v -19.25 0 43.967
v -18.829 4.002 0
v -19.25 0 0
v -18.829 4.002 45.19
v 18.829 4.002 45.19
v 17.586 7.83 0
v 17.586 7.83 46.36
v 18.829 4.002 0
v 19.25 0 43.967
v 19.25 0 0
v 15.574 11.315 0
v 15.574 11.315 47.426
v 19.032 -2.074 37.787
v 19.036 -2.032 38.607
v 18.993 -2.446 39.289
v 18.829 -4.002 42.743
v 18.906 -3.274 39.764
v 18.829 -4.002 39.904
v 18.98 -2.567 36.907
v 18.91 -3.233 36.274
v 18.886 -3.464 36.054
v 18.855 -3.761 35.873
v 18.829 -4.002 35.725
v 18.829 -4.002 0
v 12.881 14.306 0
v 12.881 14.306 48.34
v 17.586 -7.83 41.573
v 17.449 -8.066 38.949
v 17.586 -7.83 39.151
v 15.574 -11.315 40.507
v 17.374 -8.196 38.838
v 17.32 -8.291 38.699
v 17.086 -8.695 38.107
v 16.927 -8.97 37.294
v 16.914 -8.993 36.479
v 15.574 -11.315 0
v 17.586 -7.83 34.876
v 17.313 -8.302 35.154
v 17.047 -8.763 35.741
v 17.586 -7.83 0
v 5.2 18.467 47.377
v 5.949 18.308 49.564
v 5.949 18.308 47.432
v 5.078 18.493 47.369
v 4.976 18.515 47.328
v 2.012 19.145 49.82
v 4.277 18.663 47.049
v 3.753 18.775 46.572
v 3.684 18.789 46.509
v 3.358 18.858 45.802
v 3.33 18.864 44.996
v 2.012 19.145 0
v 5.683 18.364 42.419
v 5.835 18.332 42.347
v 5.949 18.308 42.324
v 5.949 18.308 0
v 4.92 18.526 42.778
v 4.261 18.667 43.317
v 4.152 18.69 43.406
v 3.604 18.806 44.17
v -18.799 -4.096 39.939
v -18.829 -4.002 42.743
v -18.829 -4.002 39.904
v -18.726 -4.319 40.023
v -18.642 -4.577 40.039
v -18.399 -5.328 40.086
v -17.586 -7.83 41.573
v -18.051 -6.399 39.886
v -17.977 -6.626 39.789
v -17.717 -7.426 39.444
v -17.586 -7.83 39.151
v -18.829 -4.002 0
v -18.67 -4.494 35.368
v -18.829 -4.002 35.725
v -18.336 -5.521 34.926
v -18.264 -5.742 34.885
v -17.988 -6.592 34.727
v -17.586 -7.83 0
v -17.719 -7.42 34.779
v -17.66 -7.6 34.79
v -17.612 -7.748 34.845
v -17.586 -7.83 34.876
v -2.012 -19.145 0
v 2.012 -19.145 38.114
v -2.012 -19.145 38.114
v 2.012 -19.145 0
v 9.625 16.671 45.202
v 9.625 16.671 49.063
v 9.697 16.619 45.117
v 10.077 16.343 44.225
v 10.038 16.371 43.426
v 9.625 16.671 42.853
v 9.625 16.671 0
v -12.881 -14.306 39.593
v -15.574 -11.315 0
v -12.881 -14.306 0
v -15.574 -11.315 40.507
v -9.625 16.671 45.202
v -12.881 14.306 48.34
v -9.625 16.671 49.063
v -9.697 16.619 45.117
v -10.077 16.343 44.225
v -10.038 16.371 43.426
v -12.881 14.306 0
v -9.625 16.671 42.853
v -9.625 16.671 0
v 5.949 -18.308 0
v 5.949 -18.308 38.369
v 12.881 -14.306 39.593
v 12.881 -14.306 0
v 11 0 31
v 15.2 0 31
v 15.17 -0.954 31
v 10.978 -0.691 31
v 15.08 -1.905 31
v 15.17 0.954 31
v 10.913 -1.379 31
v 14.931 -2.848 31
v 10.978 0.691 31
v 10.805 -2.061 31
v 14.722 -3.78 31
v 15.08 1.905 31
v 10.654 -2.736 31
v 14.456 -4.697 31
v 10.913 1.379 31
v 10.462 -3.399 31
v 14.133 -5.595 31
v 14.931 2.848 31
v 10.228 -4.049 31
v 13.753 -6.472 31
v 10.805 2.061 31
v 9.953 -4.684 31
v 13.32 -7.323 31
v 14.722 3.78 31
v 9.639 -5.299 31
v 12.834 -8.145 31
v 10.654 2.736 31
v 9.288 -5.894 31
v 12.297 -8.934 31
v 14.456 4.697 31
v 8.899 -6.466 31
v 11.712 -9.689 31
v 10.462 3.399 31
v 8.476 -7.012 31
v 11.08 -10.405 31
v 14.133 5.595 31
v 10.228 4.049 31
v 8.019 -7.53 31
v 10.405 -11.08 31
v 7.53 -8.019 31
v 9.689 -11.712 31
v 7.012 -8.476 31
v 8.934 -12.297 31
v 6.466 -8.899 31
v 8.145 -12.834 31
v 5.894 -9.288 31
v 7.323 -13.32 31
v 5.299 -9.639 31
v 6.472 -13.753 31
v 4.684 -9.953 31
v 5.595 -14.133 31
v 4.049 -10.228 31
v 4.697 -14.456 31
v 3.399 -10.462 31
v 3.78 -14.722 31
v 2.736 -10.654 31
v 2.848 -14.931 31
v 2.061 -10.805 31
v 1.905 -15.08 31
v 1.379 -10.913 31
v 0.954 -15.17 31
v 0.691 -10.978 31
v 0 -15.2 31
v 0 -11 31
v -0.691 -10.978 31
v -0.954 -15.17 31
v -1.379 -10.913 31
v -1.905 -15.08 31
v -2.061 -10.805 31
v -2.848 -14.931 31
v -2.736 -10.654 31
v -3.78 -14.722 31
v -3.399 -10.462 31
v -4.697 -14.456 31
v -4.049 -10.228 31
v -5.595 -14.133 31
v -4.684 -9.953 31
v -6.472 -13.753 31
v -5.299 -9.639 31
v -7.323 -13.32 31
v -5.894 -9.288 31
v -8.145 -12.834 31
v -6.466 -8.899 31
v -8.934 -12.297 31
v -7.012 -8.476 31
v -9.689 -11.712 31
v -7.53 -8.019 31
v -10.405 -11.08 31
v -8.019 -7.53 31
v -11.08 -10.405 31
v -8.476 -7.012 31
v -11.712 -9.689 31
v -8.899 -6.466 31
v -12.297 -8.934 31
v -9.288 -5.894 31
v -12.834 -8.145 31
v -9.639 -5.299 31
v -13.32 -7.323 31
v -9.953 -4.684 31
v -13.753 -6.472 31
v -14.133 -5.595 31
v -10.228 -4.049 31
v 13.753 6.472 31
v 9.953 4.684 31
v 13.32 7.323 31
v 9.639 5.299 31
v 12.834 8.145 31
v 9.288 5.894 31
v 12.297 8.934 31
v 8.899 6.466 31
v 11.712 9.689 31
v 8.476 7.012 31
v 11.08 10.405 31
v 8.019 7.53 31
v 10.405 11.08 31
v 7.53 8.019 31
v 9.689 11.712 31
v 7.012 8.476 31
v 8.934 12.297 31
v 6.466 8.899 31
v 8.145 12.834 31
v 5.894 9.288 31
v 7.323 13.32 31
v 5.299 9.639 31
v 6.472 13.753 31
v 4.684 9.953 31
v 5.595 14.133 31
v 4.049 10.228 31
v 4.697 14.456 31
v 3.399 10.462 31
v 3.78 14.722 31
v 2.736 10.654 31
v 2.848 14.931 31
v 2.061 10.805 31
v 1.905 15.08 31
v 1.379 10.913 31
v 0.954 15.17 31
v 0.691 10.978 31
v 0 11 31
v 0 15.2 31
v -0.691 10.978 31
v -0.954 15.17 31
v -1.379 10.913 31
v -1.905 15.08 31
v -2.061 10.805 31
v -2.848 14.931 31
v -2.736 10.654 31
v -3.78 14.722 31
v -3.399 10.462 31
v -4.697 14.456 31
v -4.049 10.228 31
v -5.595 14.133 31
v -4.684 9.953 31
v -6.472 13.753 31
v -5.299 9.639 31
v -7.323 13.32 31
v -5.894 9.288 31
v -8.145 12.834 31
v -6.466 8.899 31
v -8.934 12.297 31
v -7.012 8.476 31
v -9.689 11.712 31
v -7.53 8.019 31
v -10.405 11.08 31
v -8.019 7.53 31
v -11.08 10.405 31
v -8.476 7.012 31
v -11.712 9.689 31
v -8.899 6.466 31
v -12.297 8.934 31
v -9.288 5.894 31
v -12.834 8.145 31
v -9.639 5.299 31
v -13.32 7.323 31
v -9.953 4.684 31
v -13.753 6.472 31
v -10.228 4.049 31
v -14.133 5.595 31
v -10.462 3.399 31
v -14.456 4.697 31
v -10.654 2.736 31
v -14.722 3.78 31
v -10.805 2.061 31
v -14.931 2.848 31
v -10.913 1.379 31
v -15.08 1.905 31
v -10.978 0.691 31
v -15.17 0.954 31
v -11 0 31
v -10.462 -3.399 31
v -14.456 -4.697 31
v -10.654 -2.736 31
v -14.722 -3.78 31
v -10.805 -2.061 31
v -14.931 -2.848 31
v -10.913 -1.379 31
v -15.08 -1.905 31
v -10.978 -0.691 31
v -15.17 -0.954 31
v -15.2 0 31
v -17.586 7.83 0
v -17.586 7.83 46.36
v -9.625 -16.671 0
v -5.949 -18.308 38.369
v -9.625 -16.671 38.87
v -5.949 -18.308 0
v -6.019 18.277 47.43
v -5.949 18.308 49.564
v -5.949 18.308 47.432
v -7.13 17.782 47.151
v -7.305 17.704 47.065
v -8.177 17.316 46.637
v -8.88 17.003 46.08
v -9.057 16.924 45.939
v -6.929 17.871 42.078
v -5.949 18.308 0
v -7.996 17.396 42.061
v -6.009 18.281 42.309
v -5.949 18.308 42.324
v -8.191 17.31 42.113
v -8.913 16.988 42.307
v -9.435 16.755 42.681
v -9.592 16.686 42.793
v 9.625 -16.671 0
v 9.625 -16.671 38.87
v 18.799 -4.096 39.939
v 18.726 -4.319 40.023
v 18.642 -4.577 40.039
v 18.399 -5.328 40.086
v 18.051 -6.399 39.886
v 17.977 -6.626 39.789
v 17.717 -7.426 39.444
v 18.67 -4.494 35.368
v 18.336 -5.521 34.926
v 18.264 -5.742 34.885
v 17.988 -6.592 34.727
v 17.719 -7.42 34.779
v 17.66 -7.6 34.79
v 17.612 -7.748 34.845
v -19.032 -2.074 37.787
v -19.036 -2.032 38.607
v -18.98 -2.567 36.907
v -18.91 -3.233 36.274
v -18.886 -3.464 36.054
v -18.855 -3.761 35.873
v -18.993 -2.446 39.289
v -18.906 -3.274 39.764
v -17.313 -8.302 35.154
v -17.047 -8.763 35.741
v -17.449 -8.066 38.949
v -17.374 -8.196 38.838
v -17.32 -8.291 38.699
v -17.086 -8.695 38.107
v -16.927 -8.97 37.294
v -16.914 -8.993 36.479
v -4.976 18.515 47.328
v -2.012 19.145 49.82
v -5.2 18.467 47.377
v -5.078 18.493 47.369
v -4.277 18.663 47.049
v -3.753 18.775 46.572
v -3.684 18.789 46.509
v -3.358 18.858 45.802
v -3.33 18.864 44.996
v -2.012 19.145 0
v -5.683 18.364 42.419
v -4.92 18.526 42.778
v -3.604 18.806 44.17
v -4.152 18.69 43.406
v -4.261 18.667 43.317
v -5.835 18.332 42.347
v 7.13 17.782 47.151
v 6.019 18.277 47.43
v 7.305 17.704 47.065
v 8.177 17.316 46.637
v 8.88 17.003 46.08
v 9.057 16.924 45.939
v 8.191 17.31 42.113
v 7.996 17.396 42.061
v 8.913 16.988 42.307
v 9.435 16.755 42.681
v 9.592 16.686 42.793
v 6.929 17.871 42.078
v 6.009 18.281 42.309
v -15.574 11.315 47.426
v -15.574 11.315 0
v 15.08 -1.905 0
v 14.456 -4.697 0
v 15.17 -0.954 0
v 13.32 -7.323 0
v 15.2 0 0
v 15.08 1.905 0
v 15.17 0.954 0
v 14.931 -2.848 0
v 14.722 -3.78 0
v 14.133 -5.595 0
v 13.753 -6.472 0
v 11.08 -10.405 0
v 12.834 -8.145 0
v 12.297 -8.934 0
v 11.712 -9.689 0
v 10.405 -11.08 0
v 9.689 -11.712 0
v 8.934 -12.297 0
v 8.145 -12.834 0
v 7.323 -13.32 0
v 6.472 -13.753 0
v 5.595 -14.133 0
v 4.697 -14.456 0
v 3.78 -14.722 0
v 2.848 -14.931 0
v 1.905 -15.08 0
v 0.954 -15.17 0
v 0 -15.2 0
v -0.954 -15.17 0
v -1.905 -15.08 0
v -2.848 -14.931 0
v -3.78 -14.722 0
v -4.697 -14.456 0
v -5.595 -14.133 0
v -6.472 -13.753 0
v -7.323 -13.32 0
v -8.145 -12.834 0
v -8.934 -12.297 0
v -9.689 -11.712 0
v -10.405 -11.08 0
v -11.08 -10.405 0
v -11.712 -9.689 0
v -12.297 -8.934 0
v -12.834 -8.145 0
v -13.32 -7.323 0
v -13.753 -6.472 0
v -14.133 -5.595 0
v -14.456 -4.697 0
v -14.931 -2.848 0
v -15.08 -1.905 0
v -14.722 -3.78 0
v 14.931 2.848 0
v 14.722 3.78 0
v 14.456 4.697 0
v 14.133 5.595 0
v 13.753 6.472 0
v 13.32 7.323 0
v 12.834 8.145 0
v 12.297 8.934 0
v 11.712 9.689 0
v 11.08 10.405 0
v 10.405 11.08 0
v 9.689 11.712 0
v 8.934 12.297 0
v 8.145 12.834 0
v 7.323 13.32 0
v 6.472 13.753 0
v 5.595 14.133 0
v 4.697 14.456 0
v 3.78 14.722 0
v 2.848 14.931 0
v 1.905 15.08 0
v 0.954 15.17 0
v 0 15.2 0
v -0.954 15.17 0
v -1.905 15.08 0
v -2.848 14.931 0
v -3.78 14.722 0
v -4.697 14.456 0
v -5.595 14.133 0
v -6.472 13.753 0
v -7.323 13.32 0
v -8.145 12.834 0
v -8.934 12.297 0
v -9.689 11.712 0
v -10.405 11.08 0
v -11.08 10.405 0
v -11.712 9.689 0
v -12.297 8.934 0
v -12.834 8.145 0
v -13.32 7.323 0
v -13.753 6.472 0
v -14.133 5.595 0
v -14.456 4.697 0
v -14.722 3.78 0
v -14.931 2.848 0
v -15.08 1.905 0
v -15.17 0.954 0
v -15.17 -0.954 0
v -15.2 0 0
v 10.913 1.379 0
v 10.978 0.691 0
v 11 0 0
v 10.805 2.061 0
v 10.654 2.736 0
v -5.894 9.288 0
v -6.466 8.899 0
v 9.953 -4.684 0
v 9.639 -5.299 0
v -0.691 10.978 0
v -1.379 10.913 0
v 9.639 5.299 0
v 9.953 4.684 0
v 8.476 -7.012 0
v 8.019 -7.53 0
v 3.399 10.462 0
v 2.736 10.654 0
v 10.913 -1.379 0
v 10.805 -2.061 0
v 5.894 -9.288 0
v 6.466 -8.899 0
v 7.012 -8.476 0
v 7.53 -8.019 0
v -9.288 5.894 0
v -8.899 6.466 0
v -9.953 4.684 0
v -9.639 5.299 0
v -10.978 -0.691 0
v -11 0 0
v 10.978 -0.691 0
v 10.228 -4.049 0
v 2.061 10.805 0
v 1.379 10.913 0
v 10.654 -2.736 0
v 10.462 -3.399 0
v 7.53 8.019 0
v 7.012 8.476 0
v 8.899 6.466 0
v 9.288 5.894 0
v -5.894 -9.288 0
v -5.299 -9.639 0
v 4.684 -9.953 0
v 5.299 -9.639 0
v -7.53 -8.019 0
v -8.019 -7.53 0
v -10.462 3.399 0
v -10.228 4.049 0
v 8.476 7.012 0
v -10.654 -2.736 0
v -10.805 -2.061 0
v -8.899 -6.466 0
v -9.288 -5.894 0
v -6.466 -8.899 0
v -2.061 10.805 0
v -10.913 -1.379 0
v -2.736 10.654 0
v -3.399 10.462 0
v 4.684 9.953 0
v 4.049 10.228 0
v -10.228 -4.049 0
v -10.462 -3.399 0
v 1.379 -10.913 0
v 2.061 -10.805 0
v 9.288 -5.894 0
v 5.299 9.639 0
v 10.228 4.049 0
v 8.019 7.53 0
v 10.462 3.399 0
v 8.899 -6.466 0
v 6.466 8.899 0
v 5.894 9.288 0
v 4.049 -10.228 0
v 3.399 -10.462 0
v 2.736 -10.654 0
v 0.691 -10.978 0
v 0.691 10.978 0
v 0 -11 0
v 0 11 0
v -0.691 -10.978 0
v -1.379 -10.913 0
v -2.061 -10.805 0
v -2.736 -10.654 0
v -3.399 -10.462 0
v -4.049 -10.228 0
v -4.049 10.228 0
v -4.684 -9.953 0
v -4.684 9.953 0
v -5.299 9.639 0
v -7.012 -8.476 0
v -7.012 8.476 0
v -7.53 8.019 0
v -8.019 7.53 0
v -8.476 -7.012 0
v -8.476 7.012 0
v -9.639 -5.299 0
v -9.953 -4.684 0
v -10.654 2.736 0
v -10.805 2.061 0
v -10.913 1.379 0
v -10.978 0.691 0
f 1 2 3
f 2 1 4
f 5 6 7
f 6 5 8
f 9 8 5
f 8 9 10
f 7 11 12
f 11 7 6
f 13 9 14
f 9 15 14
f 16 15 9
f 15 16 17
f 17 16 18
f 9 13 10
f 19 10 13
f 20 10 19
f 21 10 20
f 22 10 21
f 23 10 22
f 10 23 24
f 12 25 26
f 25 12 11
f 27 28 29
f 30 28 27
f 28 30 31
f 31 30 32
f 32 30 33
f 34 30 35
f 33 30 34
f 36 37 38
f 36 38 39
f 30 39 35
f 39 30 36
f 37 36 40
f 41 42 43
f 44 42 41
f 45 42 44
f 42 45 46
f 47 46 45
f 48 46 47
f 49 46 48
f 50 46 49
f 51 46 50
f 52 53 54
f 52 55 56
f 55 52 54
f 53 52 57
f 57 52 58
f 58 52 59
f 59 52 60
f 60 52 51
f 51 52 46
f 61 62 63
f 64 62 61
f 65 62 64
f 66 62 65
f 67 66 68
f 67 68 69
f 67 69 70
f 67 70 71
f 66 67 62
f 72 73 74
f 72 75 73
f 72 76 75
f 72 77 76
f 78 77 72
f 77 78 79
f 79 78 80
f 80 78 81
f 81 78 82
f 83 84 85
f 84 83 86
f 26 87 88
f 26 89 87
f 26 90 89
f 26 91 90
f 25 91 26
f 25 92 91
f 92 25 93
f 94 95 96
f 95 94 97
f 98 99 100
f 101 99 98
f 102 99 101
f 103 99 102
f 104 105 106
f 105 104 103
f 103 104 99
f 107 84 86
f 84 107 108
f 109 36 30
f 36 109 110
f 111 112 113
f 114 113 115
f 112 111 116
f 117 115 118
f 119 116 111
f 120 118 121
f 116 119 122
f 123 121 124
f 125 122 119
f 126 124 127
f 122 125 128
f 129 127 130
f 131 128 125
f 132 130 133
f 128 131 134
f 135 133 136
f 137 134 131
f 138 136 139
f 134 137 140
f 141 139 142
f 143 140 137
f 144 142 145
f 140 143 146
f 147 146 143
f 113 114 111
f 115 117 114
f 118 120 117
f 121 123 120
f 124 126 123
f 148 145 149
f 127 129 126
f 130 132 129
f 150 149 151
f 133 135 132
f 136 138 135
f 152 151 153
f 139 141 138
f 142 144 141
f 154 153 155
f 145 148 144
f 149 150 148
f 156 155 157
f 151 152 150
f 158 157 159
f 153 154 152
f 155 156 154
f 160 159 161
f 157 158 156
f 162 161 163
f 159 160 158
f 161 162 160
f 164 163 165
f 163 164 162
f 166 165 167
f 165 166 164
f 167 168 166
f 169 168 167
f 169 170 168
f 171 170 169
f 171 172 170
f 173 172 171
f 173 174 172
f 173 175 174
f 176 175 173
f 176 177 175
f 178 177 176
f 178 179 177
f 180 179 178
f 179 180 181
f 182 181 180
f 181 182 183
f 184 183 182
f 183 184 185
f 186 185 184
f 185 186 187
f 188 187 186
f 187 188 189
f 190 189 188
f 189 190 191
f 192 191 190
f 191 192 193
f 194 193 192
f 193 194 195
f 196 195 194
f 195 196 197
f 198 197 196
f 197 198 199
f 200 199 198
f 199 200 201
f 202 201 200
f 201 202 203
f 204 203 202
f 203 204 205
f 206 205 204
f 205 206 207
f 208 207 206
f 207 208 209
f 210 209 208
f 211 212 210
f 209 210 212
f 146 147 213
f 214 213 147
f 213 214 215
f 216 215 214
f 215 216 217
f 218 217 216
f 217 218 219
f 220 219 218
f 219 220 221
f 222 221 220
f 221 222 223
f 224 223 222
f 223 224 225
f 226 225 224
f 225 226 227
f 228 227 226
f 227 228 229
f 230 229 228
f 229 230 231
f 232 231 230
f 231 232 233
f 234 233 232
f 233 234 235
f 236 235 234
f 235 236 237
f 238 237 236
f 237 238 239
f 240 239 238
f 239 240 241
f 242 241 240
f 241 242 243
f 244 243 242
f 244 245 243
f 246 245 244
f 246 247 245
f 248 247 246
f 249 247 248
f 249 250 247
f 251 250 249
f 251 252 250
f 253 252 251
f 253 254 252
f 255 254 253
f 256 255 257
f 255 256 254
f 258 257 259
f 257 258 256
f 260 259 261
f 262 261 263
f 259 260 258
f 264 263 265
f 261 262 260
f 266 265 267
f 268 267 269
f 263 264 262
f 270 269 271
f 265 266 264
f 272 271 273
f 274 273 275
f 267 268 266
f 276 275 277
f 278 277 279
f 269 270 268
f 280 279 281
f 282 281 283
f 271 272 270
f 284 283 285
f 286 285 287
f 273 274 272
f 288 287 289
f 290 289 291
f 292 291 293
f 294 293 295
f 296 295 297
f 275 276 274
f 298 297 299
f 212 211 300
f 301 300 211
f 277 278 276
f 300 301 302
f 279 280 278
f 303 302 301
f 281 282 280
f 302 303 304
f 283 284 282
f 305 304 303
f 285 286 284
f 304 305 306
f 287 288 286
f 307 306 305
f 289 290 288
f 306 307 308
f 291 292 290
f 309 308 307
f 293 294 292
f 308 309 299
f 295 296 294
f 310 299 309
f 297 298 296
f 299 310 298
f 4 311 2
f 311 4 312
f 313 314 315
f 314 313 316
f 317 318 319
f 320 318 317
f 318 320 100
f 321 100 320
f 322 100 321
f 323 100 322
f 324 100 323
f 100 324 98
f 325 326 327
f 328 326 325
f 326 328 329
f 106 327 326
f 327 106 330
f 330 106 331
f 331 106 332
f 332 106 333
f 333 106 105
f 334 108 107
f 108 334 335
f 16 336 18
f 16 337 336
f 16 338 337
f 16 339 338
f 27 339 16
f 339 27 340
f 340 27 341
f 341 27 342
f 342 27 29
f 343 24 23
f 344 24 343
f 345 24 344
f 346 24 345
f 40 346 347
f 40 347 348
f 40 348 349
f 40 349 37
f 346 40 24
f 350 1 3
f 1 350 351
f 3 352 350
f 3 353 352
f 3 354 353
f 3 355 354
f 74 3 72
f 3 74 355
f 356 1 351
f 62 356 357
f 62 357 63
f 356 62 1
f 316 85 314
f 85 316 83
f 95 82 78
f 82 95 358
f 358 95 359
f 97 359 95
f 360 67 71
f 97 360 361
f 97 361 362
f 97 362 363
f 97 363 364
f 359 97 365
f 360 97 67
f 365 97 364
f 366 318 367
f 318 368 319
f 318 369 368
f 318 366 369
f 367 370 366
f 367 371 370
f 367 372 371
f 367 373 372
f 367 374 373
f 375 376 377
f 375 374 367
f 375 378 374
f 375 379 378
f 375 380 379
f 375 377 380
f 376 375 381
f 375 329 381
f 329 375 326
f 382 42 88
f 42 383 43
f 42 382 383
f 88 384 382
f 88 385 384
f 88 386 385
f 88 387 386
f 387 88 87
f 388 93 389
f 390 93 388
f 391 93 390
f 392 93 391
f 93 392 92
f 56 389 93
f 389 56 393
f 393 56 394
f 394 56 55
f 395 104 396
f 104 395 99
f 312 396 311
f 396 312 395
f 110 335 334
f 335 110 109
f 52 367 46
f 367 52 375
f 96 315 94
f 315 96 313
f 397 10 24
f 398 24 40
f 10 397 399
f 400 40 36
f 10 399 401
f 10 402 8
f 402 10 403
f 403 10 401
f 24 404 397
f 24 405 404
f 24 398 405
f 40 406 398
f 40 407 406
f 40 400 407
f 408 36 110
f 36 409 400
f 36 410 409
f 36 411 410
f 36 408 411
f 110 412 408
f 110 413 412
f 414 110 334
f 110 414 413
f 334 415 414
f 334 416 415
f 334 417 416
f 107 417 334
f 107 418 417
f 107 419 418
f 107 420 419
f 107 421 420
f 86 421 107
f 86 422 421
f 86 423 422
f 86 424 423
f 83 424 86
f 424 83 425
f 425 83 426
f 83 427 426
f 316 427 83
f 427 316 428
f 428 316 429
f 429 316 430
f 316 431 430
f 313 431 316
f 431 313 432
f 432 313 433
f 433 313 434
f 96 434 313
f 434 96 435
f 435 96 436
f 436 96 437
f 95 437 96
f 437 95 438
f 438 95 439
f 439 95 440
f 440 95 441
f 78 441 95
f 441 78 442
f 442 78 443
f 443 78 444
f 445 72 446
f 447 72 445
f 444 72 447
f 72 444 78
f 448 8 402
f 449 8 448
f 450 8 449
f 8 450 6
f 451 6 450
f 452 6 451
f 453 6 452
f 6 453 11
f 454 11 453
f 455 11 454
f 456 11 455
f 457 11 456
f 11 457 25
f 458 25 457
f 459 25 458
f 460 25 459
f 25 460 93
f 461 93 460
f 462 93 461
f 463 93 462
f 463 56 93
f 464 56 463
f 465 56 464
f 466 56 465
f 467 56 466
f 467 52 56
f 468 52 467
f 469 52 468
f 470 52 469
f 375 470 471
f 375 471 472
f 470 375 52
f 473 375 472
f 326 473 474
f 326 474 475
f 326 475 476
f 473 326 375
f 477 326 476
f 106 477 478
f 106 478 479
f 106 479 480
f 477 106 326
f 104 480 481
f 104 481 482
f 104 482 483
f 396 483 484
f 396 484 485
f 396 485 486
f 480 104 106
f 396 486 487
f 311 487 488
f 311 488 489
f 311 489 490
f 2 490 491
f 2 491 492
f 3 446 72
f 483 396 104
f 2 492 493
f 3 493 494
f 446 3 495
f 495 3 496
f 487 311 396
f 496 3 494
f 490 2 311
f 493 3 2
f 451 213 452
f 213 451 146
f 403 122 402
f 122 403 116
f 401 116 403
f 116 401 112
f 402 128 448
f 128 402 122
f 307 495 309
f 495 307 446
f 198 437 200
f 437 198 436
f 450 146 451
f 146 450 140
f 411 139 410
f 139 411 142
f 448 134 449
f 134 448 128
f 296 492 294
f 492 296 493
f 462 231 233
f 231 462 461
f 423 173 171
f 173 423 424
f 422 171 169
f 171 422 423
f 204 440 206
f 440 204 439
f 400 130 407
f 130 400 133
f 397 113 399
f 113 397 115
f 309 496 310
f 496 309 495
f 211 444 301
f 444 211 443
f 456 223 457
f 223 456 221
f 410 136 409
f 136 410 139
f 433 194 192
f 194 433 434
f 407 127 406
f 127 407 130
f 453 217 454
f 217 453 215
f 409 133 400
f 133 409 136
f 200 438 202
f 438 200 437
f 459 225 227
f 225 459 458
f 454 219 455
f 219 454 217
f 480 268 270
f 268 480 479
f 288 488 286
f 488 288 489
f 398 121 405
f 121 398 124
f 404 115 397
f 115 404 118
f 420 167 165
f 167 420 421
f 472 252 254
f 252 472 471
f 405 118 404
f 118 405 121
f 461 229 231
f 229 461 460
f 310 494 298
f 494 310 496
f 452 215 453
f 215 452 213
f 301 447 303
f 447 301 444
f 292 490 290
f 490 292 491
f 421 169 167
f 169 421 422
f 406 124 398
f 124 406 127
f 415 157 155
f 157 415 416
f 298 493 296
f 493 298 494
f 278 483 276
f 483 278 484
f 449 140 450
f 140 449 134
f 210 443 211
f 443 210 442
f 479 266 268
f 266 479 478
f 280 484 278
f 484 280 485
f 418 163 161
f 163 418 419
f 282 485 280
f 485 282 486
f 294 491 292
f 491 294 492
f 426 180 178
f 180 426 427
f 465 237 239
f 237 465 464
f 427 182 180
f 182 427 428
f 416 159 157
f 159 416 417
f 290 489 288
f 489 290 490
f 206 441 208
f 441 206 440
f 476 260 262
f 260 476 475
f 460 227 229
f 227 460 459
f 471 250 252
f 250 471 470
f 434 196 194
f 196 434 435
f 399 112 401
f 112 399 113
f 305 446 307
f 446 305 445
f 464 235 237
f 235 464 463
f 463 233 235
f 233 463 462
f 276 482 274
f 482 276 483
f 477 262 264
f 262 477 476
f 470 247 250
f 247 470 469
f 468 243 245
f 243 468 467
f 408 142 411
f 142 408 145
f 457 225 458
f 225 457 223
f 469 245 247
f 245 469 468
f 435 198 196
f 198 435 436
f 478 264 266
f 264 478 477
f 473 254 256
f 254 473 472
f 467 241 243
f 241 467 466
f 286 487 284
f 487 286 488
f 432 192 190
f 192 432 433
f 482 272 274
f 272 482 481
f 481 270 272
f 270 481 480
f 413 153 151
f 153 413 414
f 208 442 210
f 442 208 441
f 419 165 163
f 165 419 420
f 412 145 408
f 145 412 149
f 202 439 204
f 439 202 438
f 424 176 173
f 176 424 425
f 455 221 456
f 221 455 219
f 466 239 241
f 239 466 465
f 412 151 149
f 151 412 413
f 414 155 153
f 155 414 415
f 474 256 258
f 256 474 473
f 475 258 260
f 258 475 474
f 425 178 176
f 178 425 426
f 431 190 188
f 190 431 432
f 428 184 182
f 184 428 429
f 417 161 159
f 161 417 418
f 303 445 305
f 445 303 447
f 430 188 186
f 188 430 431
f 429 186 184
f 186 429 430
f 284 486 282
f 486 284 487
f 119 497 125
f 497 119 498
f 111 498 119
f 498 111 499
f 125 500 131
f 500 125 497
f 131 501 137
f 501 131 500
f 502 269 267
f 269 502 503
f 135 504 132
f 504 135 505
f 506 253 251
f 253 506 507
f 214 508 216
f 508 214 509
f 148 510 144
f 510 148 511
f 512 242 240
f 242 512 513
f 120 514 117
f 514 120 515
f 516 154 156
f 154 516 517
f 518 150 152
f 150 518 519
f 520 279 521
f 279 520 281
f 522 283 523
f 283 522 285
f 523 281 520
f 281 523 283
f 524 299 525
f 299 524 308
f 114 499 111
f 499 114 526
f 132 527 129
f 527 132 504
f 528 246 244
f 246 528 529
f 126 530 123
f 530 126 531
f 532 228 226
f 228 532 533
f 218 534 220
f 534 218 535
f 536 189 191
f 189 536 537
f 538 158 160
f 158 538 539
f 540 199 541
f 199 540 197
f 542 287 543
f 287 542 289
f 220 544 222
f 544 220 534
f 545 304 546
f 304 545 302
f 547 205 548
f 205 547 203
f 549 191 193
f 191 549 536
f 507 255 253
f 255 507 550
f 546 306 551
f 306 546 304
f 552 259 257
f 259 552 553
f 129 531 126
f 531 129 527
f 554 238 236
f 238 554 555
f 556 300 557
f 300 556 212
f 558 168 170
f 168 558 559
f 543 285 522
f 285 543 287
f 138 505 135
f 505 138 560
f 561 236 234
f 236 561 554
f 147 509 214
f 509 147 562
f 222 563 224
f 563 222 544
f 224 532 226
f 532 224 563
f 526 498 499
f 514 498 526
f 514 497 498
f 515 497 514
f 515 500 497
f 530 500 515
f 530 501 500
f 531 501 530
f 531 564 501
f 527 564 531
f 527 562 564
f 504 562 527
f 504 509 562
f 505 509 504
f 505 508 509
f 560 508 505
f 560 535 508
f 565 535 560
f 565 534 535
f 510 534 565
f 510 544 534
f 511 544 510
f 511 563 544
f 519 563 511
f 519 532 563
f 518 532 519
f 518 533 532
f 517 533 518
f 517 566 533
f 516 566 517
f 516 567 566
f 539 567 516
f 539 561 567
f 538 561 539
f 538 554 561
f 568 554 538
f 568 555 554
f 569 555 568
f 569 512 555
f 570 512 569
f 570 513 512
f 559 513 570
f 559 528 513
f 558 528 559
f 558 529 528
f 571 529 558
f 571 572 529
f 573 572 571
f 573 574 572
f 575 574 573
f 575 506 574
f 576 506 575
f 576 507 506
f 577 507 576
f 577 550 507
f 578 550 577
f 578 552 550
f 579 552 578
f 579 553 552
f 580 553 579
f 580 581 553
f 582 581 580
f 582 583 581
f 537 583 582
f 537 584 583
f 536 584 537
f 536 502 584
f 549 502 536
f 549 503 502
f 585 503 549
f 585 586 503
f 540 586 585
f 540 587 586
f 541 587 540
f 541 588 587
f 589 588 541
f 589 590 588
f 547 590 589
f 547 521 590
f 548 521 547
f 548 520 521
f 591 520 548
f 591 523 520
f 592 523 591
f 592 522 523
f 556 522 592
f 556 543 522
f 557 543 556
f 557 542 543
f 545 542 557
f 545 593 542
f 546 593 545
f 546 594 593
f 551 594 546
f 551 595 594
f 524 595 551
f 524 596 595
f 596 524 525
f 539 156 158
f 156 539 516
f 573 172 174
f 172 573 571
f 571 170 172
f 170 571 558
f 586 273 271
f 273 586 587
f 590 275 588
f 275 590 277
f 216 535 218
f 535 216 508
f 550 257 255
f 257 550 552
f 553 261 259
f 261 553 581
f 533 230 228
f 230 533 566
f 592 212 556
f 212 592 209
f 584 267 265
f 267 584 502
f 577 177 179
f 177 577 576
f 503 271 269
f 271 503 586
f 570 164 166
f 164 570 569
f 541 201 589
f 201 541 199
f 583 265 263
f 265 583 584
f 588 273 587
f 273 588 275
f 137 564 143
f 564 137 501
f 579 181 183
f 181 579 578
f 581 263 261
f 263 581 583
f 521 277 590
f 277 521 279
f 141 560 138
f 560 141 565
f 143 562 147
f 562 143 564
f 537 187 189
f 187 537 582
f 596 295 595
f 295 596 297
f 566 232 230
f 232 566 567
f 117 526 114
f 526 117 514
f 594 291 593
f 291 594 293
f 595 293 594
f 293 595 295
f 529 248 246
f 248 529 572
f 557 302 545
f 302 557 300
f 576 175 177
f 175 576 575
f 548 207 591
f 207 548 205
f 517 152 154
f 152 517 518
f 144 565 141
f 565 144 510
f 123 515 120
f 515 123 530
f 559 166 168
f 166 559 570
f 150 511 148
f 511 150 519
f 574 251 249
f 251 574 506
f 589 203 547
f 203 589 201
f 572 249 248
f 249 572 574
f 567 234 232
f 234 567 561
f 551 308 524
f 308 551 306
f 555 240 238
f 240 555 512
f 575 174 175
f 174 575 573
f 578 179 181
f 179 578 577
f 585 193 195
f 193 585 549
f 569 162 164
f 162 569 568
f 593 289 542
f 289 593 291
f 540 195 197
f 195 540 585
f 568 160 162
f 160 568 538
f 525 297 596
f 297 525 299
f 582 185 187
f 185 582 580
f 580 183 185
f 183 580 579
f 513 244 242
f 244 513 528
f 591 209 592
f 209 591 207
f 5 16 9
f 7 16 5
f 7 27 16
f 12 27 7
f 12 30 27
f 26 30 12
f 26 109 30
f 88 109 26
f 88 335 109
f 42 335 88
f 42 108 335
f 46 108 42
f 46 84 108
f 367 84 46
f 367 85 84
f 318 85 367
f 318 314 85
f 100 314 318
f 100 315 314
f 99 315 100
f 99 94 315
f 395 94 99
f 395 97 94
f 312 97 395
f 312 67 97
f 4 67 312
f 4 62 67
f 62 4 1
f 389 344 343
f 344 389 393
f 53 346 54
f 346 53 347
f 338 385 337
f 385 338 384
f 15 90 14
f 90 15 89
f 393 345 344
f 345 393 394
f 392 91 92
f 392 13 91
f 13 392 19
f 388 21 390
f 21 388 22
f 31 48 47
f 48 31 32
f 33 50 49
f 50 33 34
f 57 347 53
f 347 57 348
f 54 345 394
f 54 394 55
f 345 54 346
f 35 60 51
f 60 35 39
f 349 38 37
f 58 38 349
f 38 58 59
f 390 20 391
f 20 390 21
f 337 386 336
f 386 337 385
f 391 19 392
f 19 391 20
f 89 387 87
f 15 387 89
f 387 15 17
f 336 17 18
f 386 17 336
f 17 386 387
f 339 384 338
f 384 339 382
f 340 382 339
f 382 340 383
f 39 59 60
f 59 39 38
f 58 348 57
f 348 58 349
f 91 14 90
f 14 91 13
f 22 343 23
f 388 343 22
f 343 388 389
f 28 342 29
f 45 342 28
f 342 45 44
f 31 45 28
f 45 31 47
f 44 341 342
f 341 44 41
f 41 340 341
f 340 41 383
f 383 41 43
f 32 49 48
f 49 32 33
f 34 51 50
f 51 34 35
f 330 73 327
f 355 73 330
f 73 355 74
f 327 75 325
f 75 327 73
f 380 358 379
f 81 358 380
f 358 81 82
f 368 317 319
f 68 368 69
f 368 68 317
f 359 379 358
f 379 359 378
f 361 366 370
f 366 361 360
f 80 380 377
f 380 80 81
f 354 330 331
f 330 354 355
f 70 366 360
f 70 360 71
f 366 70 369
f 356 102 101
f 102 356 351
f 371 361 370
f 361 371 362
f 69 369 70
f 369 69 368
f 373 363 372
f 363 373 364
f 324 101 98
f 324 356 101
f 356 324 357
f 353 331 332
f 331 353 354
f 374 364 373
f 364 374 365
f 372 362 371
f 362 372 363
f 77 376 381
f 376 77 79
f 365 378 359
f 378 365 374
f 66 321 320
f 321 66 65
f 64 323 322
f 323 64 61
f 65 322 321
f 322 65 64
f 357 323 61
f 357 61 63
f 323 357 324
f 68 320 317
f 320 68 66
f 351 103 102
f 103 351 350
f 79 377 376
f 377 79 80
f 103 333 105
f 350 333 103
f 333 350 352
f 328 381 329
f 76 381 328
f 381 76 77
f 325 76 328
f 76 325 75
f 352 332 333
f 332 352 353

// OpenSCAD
dicke = 10;
angle = 17;

base_inner = 30.4;
base_outer= 38.5;

kreuz_width = 200;
kreuz_depth = 25;

arm_len = 200;
arm_width = 20;

angle_gw = 65; // do not change or you'll need to re-print the bottom

module hole() {
    translate([0,0,-1]) cylinder(h=31+2, d=base_inner, $fn=100);
}


module base() {
    difference() {
        cylinder(h=31, d=base_outer);
        hole();
    }
    cylinder(h=31, d=22, $fn=100);

}

module top() {
    color([1,0,0]) translate([0,0,31]) {
        difference() {
            cylinder(h=23, d=base_outer);
            rotate([angle, 0, 0]) translate([0,1,37.4]) cube([50,50,50], center=true);
        }
    }
}


module dish2() {
    base();
    z=34;
    difference () {
        union() {
            top();
            // roehren
            translate([0,0,z]) rotate([angle,0,0]) {
                gewindestangen_oben_platte();
                mirror(v=[1,0,0]) gewindestangen_oben_platte();
            }
        }
        translate([0,0,z]) rotate([angle,0,0]) {
            gewindestangen_oben_platte_loecher();
            mirror(v=[1,0,0]) gewindestangen_oben_platte_loecher();
        }
    }
}


module dish() {
    difference() {
        union() {
            difference() {
                translate([0,0,14]) rotate([angle,0,0]) {
                    //troete
                    cylinder(20, 19.3, 40, $fn=100);
                    translate([0,0,20]) {
                        // platte oben
                        cylinder(dicke, 40, 40, $fn=100);

                        //color([1,0,0]) arm_bottom();
                        //color([0,1,0]) mirror(v=[1,0,0]) arm_bottom();
                        

                        gewindestangen_oben_platte();
                        mirror(v=[1,0,0]) gewindestangen_oben_platte();
                    } 
                }
                hole();
            }
            base();
        }
        gw_loecher_fuer_dish();
}
}

module gw_loecher_fuer_dish() {
    translate([0,0,14]) rotate([angle,0,0]) {
        translate([0,0,20]) {    
            color([0,0,1]) arm_gwstange(d=5);
            mirror(v=[1,0,0]) arm_gwstange(d=5); 
        }
    }
}

module gewindestangen_oben_platte() {
    //difference() {
        translate([16,0,5]) rotate([angle_gw, 90, 0]) {
            translate([0,0,-27]) ;
        }
    // gewindestangen_oben_platte_loecher();
    //}
}

module gewindestangen_oben_platte_loecher() {
    translate([16,0,5]) rotate([angle_gw, 90, 0]) {
        translate([0,0,-30]) cylinder(h=45, d=5, $fn=20);
    }
}

module gewindestange(length=250, d=5) {
     rotate([angle_gw, 90,0]) translate([0,0,-50]) cylinder(h=length, d=d, $fn=100);
}


module arm_gwstange(length=250, d=5) {
   translate([16,0,5]) gewindestange(length=length, d=d);
}

module arm_bottom() {
    len=50;
    difference() {
        translate([87,-200,0]) {
            difference() {
                difference() {
                    cube([45, len, dicke]);
                    // loch 1 gewindestange von oben
                    rotate([0,0,-angle_gw]) translate([-20,25,-1]) cube([5, 10, dicke+2]);
                }
                // loch 2 gewindestange von oben
                rotate([0,0,-angle_gw]) translate([-8,25,-1]) cube([5, 10, dicke+2]);
            }
            difference() {
                translate([0,-7,0]) cube([45,7,dicke+12]);
                // gewindestange rechts-links loch
                rotate([0,0,angle_gw]) translate([0,-8,4]) gewindestange(100);
            }
        }
        arm_gwstange(length=260);
    }
}

//rotate([0,0,30]) cube([20, 200, 10],center=true);


dish2();

//gewindestange();


//!kreuz();

//!rotate([angle,0,0]) arm2();
//mirror(v=[1,0,0]) arm2();




module kreuz() {
    kreuz_dim_x=35;
    kreuz_dim_y=60;
    translate([0,-kreuz_depth/2,0]) {
        translate([-kreuz_width/2,0,0]) cube([kreuz_width,kreuz_depth,dicke]);
        translate([-kreuz_dim_x/2,-(kreuz_dim_y-kreuz_depth)/2,0]) cube([kreuz_dim_x,kreuz_dim_y, dicke]);
    }
}


module arm() {
    rotate([0,0,20]) {
        difference() {
            cube([arm_width, arm_len, dicke]);
            rotate([0,0,-20]) group() {
                translate([-4.18,0,-1]) cube([23,7.1,12]);
            }
        }
        rotate([0,0,-20]) translate([-((arm_width*2))-4.18,7,0]) cube([arm_width*3, 6, dicke+15]);
    }
}

module arm2() {
    translate([-90,-160,0]) {
    linear_extrude(dicke) import("./arm.svg");
    cube([arm_width*3, 8, dicke+15]);
    }
}


module arm_holder() {
    h_len=150;
    
    translate([-30,20,0]) rotate([0,0,-45]) cube([h_len, 20, dicke]);
    mirror(v=[1,0,0]) translate([-30,20,0]) rotate([0,0,-45]) cube([h_len, 20, dicke]);
    
}
